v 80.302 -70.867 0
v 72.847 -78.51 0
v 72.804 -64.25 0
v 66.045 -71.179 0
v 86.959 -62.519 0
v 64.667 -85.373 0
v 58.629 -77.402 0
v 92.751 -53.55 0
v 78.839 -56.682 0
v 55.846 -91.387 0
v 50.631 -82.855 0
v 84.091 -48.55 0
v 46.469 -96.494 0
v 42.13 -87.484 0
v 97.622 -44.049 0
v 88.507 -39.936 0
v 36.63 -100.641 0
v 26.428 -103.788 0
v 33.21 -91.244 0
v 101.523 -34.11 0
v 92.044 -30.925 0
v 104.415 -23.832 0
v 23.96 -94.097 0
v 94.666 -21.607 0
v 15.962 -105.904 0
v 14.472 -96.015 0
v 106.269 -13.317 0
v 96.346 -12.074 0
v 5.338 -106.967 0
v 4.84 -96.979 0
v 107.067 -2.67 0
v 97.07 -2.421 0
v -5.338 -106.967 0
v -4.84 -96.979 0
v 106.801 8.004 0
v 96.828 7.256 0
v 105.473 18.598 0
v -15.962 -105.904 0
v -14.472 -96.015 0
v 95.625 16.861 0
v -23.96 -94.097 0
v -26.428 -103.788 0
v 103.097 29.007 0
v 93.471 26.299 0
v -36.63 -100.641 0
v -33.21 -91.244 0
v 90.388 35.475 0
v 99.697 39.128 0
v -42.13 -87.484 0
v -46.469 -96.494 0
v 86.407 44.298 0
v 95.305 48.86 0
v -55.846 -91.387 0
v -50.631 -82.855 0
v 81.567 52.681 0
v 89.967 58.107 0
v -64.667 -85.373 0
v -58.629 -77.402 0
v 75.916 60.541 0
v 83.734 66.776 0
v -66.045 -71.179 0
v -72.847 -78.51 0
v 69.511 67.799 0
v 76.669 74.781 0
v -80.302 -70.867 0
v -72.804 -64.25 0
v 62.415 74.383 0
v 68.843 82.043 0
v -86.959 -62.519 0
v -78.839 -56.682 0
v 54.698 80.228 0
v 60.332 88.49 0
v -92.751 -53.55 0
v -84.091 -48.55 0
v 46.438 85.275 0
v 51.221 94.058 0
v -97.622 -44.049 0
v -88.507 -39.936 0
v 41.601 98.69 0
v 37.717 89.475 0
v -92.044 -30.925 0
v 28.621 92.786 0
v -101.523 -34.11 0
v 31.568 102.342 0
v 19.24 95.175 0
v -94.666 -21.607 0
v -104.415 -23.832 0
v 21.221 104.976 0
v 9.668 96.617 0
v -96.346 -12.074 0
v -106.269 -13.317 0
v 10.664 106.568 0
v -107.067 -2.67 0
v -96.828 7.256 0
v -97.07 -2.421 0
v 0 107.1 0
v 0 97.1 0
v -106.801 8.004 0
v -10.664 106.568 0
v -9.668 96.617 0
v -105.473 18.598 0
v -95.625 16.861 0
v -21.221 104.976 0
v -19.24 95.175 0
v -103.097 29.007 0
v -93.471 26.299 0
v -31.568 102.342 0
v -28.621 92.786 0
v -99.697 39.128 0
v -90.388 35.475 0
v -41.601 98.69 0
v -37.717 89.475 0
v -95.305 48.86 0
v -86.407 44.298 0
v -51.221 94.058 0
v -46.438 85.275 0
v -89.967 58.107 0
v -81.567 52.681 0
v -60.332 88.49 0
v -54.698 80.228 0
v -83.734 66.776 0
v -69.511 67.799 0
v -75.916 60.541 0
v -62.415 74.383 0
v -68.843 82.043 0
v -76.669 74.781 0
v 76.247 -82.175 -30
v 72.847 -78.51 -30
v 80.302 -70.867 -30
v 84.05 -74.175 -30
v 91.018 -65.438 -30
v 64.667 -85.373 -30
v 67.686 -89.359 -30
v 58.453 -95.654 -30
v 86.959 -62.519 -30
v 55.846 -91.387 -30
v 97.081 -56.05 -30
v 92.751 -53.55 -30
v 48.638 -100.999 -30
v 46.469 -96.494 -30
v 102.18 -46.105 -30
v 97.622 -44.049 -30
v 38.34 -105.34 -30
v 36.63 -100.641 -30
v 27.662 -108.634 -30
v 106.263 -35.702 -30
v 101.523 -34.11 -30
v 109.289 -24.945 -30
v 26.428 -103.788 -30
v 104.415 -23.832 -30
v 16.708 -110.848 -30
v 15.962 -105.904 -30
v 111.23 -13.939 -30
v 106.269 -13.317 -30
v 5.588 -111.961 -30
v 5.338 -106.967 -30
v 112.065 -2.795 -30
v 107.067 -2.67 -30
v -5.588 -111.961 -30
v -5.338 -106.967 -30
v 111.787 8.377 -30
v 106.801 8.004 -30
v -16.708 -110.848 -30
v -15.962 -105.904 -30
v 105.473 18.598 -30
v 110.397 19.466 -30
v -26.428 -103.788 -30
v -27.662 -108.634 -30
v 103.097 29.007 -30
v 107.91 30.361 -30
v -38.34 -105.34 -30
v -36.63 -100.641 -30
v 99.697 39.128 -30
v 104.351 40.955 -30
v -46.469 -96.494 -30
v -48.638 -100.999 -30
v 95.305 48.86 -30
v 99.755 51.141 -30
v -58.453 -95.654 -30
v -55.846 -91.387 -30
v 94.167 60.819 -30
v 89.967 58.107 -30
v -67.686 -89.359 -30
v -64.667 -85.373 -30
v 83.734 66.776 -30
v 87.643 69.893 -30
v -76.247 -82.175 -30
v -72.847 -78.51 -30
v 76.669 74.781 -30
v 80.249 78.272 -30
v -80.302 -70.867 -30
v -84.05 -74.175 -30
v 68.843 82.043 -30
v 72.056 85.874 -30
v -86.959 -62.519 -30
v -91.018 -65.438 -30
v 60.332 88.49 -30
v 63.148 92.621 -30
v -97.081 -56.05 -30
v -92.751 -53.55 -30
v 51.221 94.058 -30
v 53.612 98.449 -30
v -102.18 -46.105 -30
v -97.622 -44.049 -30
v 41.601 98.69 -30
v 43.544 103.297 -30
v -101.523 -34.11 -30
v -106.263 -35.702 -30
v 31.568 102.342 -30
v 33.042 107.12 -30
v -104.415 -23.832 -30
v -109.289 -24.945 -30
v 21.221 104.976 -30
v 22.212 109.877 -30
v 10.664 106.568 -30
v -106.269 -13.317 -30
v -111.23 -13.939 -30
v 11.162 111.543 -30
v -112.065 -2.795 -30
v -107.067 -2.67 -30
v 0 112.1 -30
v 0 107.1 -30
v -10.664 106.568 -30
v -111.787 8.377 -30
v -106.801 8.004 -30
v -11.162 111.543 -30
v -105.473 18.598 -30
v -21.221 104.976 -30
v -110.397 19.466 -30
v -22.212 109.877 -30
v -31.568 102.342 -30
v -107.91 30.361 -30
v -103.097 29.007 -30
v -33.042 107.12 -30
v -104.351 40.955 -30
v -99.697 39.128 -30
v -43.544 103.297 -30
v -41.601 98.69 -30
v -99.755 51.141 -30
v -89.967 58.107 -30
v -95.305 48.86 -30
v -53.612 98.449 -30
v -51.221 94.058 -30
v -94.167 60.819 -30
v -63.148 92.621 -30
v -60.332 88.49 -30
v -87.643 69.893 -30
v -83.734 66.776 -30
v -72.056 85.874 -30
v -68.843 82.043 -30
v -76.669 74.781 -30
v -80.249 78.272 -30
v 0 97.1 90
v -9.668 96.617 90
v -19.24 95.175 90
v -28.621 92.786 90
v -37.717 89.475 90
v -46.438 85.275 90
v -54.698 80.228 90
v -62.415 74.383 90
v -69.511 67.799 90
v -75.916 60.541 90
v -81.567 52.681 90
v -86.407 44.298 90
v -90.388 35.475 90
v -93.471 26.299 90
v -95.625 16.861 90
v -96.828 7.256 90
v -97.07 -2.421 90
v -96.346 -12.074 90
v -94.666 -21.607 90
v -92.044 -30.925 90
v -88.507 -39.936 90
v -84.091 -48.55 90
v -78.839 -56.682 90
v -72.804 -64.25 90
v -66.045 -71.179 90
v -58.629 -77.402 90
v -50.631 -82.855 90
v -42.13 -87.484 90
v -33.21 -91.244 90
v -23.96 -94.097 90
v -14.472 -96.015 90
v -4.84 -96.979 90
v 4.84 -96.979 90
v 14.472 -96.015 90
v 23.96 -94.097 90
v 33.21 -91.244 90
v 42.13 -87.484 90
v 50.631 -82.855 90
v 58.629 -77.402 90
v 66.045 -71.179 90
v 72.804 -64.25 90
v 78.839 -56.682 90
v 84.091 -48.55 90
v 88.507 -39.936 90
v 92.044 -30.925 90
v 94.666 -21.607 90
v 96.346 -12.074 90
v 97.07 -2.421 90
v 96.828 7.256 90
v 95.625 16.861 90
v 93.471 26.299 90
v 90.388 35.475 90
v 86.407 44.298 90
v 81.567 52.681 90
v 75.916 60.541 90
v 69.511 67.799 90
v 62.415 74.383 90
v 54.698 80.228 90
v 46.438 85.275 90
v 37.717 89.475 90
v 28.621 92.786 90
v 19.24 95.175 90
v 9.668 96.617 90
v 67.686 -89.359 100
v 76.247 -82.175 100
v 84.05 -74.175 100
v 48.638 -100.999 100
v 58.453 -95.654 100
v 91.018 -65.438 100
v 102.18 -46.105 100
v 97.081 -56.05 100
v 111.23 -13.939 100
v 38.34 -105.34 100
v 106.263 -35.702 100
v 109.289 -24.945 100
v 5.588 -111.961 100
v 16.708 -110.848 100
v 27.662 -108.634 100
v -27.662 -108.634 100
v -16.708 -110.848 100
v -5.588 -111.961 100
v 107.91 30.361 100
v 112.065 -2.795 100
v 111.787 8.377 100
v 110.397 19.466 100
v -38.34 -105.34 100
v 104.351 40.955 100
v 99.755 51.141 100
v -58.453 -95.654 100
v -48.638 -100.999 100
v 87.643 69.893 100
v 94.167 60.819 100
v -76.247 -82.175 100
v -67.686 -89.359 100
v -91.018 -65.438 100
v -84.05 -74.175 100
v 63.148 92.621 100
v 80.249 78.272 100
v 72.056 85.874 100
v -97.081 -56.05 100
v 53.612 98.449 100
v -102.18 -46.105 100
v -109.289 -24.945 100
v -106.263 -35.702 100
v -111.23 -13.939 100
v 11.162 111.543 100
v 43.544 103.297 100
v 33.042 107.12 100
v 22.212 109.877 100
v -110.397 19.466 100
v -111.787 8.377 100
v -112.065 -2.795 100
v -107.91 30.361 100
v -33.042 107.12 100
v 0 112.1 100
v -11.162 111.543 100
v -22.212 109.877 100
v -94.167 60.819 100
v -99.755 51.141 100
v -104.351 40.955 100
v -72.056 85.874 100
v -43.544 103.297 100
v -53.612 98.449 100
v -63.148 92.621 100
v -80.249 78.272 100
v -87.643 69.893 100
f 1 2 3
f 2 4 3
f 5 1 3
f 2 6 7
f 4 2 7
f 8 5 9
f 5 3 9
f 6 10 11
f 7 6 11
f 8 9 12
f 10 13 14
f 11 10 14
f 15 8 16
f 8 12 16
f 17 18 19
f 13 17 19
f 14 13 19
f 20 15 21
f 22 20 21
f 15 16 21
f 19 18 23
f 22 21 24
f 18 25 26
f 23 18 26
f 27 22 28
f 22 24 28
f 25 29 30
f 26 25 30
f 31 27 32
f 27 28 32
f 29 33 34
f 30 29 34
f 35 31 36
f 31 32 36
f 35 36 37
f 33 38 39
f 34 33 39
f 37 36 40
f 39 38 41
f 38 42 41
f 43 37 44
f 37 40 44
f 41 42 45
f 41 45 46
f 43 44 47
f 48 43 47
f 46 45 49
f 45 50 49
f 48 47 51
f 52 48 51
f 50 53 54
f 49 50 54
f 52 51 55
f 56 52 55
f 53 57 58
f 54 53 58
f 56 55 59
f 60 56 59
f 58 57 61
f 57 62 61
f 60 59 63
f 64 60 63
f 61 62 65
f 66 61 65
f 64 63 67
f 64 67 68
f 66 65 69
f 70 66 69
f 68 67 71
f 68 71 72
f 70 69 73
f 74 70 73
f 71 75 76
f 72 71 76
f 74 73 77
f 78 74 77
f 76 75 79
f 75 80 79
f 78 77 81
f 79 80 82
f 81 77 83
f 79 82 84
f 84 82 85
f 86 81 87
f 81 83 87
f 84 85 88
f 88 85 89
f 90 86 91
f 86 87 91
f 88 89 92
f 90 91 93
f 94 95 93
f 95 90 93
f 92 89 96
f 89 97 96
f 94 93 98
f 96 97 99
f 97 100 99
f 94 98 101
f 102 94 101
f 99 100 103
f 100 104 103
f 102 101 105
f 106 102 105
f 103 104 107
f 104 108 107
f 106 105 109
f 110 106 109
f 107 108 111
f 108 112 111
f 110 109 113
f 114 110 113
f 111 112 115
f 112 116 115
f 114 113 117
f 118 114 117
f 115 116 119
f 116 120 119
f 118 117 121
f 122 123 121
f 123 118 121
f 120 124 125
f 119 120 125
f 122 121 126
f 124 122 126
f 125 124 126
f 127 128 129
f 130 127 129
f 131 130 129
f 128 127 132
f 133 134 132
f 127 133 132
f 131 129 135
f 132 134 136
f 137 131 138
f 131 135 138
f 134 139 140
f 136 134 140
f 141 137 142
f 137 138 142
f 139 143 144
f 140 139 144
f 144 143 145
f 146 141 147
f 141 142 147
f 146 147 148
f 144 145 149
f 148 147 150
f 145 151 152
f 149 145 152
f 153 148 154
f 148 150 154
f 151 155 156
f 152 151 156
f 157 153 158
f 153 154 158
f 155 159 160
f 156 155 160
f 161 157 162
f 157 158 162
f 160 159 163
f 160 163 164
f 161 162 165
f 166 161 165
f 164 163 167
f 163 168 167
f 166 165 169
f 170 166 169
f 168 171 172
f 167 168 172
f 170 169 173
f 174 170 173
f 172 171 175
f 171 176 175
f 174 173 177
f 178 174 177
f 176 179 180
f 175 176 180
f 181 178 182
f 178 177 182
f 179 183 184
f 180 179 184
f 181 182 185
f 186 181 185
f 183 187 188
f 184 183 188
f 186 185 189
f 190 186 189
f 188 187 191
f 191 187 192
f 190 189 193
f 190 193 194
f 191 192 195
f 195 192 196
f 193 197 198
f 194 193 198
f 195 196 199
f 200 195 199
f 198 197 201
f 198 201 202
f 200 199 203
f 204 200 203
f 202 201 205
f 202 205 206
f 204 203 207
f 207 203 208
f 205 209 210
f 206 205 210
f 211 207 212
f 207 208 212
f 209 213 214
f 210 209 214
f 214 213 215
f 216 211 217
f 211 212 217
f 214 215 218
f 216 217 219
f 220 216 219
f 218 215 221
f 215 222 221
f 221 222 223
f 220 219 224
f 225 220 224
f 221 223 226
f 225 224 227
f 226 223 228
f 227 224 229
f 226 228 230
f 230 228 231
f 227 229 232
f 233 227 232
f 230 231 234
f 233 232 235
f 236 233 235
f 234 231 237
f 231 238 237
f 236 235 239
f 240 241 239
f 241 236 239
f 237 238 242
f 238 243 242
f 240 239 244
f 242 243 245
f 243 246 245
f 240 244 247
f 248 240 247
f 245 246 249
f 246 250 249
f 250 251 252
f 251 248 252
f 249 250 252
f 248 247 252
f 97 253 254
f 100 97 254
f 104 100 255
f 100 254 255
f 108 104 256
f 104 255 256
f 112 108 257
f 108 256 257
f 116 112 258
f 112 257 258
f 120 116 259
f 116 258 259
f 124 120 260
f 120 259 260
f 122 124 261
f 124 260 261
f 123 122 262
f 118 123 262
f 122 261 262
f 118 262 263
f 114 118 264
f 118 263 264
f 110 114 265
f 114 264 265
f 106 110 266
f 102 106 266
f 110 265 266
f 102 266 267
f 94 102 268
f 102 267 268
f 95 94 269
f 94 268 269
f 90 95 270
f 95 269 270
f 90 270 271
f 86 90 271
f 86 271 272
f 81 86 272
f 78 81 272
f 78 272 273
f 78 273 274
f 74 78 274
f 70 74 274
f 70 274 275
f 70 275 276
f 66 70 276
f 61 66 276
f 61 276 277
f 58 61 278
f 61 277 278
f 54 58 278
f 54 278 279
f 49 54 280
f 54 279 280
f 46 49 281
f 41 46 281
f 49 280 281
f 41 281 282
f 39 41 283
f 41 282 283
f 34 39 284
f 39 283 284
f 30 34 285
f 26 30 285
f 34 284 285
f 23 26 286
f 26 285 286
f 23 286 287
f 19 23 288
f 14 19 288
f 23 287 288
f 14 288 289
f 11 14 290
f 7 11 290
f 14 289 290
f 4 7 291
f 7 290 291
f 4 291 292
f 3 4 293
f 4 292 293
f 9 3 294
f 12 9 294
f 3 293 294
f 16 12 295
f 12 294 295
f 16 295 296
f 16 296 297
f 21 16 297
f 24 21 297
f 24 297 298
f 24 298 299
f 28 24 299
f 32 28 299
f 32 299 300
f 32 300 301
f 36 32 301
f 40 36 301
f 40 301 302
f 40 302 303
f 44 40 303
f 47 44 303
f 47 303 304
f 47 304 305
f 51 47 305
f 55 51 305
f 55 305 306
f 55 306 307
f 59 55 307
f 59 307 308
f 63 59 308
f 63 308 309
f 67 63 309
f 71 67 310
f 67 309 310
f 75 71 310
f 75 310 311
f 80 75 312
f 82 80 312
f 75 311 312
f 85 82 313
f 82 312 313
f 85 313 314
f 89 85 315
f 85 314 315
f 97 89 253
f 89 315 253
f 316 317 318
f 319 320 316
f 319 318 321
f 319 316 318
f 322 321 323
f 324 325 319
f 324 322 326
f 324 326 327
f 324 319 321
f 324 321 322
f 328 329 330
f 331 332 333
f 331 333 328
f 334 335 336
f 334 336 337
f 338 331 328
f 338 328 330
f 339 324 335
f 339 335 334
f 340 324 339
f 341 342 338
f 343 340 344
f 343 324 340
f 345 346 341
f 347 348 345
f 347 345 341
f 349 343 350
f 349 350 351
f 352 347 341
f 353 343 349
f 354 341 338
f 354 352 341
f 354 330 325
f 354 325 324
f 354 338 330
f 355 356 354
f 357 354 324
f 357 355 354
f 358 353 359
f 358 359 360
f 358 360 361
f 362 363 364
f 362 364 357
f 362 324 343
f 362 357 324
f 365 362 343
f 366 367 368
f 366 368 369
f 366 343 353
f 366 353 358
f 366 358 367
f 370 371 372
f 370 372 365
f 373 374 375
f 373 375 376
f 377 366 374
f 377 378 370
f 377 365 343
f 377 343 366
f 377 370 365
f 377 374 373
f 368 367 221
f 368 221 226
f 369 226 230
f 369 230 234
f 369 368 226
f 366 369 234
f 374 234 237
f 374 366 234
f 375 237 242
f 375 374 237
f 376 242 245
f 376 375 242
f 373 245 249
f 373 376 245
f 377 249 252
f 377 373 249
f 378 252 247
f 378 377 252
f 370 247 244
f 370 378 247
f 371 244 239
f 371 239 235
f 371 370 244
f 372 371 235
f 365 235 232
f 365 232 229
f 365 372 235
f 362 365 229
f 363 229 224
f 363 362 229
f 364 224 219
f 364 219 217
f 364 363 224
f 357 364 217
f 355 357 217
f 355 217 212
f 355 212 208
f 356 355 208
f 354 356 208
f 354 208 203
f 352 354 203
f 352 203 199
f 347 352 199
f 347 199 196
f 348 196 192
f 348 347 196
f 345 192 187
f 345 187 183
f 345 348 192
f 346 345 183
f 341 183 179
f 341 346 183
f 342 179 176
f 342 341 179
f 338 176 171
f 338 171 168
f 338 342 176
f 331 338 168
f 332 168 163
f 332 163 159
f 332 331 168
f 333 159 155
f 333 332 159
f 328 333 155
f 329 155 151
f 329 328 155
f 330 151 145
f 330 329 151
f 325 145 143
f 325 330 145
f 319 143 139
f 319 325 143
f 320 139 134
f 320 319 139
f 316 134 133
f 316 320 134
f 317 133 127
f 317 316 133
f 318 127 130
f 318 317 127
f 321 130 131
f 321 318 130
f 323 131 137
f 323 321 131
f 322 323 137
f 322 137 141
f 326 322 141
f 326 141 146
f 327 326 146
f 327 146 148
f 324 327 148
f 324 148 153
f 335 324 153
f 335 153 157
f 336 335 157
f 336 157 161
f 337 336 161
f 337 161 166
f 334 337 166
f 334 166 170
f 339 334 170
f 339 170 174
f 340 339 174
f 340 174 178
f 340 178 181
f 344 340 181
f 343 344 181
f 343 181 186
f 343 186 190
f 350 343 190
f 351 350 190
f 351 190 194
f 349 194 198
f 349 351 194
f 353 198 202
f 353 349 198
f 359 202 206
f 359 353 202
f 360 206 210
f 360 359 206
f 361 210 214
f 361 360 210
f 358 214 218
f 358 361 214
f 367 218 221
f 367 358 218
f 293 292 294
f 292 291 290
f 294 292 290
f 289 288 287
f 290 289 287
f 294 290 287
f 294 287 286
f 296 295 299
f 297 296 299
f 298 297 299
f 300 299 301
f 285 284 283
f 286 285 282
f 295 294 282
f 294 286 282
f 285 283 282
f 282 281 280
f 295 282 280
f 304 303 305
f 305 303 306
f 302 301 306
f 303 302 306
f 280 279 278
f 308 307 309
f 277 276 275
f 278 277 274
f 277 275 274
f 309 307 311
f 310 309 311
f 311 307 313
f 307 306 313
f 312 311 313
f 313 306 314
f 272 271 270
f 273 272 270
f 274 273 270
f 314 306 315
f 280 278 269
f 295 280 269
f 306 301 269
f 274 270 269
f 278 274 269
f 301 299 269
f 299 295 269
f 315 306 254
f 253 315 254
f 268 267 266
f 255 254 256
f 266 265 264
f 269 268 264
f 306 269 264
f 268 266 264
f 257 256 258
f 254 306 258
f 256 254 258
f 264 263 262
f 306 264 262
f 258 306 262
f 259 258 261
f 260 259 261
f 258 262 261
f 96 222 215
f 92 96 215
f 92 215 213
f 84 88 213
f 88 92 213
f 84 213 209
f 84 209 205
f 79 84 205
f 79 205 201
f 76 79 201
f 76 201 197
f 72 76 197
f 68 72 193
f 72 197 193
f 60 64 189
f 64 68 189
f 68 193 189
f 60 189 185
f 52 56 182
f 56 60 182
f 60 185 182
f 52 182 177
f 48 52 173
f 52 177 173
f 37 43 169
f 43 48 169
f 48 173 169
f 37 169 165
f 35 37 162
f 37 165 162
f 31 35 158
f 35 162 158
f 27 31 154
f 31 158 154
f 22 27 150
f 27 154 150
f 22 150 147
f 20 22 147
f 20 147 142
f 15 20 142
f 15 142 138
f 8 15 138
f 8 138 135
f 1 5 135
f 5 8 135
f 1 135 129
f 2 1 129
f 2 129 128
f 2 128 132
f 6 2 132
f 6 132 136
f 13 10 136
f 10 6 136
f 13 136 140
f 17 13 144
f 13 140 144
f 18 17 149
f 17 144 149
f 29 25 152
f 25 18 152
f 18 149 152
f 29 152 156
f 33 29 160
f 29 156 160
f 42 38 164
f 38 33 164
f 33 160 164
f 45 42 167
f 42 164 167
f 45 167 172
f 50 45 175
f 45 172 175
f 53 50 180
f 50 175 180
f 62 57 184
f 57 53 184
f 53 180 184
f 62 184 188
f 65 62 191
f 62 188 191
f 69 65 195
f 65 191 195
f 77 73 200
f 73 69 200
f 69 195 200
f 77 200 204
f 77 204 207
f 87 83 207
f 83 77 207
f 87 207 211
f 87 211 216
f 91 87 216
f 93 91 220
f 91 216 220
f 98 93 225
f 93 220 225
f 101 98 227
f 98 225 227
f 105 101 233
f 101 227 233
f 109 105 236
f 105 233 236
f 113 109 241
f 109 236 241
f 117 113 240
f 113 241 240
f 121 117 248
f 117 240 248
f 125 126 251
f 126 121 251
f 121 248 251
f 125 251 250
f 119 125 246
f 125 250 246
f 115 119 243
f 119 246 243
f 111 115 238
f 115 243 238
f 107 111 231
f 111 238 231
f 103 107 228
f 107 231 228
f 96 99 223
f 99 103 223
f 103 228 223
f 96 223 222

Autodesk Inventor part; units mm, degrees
ref_plane "YZ Plane" through (0, 0, 0) normal (1, 0, 0) x (0, 1, 0)
ref_plane "XZ Plane" through (0, 0, 0) normal (0, 1, 0) x (-1, 0, 0)
ref_plane "XY Plane" through (0, 0, 0) normal (0, 0, 1) x (1, 0, 0)
sketch "Sketch1" plane through (0, 0, 0) normal (1, 0, 0) x (0, 1, 0)
  line L0 (106.6, 0) -> (106.6, -254) construction
  line L1 (101.6, -254) -> (101.6, 0) construction
  line L2 (-106.6, 0) -> (106.6, 0) construction
  line L3 (107.1, 0) -> (107.1, -30)
  line L4 (107.1, -30) -> (112.1, -30)
  line L5 (112.1, -30) -> (112.1, 100)
  line L6 (112.1, 100) -> (0, 100)
  line L7 (107.1, 0) -> (97.1, 0)
  line L8 (97.1, 0) -> (97.1, 90)
  line L9 (97.1, 90) -> (0, 90)
  line L10 (0, 90) -> (0, 100)
  point P0 (0, 0)
  point P1 (0, 0)
  dimension "d2" = 5
  dimension "d4" = 0.5
  dimension "d5" = 30
  dimension "d6" = 100
  dimension "d8" = 10
  dimension "d9" = 10
revolve "Revolution1" add sketch "Sketch1" angle 360 about axis through (0, 0, 90) along (0, 0, 1)
properties part number "BackCapV1"
